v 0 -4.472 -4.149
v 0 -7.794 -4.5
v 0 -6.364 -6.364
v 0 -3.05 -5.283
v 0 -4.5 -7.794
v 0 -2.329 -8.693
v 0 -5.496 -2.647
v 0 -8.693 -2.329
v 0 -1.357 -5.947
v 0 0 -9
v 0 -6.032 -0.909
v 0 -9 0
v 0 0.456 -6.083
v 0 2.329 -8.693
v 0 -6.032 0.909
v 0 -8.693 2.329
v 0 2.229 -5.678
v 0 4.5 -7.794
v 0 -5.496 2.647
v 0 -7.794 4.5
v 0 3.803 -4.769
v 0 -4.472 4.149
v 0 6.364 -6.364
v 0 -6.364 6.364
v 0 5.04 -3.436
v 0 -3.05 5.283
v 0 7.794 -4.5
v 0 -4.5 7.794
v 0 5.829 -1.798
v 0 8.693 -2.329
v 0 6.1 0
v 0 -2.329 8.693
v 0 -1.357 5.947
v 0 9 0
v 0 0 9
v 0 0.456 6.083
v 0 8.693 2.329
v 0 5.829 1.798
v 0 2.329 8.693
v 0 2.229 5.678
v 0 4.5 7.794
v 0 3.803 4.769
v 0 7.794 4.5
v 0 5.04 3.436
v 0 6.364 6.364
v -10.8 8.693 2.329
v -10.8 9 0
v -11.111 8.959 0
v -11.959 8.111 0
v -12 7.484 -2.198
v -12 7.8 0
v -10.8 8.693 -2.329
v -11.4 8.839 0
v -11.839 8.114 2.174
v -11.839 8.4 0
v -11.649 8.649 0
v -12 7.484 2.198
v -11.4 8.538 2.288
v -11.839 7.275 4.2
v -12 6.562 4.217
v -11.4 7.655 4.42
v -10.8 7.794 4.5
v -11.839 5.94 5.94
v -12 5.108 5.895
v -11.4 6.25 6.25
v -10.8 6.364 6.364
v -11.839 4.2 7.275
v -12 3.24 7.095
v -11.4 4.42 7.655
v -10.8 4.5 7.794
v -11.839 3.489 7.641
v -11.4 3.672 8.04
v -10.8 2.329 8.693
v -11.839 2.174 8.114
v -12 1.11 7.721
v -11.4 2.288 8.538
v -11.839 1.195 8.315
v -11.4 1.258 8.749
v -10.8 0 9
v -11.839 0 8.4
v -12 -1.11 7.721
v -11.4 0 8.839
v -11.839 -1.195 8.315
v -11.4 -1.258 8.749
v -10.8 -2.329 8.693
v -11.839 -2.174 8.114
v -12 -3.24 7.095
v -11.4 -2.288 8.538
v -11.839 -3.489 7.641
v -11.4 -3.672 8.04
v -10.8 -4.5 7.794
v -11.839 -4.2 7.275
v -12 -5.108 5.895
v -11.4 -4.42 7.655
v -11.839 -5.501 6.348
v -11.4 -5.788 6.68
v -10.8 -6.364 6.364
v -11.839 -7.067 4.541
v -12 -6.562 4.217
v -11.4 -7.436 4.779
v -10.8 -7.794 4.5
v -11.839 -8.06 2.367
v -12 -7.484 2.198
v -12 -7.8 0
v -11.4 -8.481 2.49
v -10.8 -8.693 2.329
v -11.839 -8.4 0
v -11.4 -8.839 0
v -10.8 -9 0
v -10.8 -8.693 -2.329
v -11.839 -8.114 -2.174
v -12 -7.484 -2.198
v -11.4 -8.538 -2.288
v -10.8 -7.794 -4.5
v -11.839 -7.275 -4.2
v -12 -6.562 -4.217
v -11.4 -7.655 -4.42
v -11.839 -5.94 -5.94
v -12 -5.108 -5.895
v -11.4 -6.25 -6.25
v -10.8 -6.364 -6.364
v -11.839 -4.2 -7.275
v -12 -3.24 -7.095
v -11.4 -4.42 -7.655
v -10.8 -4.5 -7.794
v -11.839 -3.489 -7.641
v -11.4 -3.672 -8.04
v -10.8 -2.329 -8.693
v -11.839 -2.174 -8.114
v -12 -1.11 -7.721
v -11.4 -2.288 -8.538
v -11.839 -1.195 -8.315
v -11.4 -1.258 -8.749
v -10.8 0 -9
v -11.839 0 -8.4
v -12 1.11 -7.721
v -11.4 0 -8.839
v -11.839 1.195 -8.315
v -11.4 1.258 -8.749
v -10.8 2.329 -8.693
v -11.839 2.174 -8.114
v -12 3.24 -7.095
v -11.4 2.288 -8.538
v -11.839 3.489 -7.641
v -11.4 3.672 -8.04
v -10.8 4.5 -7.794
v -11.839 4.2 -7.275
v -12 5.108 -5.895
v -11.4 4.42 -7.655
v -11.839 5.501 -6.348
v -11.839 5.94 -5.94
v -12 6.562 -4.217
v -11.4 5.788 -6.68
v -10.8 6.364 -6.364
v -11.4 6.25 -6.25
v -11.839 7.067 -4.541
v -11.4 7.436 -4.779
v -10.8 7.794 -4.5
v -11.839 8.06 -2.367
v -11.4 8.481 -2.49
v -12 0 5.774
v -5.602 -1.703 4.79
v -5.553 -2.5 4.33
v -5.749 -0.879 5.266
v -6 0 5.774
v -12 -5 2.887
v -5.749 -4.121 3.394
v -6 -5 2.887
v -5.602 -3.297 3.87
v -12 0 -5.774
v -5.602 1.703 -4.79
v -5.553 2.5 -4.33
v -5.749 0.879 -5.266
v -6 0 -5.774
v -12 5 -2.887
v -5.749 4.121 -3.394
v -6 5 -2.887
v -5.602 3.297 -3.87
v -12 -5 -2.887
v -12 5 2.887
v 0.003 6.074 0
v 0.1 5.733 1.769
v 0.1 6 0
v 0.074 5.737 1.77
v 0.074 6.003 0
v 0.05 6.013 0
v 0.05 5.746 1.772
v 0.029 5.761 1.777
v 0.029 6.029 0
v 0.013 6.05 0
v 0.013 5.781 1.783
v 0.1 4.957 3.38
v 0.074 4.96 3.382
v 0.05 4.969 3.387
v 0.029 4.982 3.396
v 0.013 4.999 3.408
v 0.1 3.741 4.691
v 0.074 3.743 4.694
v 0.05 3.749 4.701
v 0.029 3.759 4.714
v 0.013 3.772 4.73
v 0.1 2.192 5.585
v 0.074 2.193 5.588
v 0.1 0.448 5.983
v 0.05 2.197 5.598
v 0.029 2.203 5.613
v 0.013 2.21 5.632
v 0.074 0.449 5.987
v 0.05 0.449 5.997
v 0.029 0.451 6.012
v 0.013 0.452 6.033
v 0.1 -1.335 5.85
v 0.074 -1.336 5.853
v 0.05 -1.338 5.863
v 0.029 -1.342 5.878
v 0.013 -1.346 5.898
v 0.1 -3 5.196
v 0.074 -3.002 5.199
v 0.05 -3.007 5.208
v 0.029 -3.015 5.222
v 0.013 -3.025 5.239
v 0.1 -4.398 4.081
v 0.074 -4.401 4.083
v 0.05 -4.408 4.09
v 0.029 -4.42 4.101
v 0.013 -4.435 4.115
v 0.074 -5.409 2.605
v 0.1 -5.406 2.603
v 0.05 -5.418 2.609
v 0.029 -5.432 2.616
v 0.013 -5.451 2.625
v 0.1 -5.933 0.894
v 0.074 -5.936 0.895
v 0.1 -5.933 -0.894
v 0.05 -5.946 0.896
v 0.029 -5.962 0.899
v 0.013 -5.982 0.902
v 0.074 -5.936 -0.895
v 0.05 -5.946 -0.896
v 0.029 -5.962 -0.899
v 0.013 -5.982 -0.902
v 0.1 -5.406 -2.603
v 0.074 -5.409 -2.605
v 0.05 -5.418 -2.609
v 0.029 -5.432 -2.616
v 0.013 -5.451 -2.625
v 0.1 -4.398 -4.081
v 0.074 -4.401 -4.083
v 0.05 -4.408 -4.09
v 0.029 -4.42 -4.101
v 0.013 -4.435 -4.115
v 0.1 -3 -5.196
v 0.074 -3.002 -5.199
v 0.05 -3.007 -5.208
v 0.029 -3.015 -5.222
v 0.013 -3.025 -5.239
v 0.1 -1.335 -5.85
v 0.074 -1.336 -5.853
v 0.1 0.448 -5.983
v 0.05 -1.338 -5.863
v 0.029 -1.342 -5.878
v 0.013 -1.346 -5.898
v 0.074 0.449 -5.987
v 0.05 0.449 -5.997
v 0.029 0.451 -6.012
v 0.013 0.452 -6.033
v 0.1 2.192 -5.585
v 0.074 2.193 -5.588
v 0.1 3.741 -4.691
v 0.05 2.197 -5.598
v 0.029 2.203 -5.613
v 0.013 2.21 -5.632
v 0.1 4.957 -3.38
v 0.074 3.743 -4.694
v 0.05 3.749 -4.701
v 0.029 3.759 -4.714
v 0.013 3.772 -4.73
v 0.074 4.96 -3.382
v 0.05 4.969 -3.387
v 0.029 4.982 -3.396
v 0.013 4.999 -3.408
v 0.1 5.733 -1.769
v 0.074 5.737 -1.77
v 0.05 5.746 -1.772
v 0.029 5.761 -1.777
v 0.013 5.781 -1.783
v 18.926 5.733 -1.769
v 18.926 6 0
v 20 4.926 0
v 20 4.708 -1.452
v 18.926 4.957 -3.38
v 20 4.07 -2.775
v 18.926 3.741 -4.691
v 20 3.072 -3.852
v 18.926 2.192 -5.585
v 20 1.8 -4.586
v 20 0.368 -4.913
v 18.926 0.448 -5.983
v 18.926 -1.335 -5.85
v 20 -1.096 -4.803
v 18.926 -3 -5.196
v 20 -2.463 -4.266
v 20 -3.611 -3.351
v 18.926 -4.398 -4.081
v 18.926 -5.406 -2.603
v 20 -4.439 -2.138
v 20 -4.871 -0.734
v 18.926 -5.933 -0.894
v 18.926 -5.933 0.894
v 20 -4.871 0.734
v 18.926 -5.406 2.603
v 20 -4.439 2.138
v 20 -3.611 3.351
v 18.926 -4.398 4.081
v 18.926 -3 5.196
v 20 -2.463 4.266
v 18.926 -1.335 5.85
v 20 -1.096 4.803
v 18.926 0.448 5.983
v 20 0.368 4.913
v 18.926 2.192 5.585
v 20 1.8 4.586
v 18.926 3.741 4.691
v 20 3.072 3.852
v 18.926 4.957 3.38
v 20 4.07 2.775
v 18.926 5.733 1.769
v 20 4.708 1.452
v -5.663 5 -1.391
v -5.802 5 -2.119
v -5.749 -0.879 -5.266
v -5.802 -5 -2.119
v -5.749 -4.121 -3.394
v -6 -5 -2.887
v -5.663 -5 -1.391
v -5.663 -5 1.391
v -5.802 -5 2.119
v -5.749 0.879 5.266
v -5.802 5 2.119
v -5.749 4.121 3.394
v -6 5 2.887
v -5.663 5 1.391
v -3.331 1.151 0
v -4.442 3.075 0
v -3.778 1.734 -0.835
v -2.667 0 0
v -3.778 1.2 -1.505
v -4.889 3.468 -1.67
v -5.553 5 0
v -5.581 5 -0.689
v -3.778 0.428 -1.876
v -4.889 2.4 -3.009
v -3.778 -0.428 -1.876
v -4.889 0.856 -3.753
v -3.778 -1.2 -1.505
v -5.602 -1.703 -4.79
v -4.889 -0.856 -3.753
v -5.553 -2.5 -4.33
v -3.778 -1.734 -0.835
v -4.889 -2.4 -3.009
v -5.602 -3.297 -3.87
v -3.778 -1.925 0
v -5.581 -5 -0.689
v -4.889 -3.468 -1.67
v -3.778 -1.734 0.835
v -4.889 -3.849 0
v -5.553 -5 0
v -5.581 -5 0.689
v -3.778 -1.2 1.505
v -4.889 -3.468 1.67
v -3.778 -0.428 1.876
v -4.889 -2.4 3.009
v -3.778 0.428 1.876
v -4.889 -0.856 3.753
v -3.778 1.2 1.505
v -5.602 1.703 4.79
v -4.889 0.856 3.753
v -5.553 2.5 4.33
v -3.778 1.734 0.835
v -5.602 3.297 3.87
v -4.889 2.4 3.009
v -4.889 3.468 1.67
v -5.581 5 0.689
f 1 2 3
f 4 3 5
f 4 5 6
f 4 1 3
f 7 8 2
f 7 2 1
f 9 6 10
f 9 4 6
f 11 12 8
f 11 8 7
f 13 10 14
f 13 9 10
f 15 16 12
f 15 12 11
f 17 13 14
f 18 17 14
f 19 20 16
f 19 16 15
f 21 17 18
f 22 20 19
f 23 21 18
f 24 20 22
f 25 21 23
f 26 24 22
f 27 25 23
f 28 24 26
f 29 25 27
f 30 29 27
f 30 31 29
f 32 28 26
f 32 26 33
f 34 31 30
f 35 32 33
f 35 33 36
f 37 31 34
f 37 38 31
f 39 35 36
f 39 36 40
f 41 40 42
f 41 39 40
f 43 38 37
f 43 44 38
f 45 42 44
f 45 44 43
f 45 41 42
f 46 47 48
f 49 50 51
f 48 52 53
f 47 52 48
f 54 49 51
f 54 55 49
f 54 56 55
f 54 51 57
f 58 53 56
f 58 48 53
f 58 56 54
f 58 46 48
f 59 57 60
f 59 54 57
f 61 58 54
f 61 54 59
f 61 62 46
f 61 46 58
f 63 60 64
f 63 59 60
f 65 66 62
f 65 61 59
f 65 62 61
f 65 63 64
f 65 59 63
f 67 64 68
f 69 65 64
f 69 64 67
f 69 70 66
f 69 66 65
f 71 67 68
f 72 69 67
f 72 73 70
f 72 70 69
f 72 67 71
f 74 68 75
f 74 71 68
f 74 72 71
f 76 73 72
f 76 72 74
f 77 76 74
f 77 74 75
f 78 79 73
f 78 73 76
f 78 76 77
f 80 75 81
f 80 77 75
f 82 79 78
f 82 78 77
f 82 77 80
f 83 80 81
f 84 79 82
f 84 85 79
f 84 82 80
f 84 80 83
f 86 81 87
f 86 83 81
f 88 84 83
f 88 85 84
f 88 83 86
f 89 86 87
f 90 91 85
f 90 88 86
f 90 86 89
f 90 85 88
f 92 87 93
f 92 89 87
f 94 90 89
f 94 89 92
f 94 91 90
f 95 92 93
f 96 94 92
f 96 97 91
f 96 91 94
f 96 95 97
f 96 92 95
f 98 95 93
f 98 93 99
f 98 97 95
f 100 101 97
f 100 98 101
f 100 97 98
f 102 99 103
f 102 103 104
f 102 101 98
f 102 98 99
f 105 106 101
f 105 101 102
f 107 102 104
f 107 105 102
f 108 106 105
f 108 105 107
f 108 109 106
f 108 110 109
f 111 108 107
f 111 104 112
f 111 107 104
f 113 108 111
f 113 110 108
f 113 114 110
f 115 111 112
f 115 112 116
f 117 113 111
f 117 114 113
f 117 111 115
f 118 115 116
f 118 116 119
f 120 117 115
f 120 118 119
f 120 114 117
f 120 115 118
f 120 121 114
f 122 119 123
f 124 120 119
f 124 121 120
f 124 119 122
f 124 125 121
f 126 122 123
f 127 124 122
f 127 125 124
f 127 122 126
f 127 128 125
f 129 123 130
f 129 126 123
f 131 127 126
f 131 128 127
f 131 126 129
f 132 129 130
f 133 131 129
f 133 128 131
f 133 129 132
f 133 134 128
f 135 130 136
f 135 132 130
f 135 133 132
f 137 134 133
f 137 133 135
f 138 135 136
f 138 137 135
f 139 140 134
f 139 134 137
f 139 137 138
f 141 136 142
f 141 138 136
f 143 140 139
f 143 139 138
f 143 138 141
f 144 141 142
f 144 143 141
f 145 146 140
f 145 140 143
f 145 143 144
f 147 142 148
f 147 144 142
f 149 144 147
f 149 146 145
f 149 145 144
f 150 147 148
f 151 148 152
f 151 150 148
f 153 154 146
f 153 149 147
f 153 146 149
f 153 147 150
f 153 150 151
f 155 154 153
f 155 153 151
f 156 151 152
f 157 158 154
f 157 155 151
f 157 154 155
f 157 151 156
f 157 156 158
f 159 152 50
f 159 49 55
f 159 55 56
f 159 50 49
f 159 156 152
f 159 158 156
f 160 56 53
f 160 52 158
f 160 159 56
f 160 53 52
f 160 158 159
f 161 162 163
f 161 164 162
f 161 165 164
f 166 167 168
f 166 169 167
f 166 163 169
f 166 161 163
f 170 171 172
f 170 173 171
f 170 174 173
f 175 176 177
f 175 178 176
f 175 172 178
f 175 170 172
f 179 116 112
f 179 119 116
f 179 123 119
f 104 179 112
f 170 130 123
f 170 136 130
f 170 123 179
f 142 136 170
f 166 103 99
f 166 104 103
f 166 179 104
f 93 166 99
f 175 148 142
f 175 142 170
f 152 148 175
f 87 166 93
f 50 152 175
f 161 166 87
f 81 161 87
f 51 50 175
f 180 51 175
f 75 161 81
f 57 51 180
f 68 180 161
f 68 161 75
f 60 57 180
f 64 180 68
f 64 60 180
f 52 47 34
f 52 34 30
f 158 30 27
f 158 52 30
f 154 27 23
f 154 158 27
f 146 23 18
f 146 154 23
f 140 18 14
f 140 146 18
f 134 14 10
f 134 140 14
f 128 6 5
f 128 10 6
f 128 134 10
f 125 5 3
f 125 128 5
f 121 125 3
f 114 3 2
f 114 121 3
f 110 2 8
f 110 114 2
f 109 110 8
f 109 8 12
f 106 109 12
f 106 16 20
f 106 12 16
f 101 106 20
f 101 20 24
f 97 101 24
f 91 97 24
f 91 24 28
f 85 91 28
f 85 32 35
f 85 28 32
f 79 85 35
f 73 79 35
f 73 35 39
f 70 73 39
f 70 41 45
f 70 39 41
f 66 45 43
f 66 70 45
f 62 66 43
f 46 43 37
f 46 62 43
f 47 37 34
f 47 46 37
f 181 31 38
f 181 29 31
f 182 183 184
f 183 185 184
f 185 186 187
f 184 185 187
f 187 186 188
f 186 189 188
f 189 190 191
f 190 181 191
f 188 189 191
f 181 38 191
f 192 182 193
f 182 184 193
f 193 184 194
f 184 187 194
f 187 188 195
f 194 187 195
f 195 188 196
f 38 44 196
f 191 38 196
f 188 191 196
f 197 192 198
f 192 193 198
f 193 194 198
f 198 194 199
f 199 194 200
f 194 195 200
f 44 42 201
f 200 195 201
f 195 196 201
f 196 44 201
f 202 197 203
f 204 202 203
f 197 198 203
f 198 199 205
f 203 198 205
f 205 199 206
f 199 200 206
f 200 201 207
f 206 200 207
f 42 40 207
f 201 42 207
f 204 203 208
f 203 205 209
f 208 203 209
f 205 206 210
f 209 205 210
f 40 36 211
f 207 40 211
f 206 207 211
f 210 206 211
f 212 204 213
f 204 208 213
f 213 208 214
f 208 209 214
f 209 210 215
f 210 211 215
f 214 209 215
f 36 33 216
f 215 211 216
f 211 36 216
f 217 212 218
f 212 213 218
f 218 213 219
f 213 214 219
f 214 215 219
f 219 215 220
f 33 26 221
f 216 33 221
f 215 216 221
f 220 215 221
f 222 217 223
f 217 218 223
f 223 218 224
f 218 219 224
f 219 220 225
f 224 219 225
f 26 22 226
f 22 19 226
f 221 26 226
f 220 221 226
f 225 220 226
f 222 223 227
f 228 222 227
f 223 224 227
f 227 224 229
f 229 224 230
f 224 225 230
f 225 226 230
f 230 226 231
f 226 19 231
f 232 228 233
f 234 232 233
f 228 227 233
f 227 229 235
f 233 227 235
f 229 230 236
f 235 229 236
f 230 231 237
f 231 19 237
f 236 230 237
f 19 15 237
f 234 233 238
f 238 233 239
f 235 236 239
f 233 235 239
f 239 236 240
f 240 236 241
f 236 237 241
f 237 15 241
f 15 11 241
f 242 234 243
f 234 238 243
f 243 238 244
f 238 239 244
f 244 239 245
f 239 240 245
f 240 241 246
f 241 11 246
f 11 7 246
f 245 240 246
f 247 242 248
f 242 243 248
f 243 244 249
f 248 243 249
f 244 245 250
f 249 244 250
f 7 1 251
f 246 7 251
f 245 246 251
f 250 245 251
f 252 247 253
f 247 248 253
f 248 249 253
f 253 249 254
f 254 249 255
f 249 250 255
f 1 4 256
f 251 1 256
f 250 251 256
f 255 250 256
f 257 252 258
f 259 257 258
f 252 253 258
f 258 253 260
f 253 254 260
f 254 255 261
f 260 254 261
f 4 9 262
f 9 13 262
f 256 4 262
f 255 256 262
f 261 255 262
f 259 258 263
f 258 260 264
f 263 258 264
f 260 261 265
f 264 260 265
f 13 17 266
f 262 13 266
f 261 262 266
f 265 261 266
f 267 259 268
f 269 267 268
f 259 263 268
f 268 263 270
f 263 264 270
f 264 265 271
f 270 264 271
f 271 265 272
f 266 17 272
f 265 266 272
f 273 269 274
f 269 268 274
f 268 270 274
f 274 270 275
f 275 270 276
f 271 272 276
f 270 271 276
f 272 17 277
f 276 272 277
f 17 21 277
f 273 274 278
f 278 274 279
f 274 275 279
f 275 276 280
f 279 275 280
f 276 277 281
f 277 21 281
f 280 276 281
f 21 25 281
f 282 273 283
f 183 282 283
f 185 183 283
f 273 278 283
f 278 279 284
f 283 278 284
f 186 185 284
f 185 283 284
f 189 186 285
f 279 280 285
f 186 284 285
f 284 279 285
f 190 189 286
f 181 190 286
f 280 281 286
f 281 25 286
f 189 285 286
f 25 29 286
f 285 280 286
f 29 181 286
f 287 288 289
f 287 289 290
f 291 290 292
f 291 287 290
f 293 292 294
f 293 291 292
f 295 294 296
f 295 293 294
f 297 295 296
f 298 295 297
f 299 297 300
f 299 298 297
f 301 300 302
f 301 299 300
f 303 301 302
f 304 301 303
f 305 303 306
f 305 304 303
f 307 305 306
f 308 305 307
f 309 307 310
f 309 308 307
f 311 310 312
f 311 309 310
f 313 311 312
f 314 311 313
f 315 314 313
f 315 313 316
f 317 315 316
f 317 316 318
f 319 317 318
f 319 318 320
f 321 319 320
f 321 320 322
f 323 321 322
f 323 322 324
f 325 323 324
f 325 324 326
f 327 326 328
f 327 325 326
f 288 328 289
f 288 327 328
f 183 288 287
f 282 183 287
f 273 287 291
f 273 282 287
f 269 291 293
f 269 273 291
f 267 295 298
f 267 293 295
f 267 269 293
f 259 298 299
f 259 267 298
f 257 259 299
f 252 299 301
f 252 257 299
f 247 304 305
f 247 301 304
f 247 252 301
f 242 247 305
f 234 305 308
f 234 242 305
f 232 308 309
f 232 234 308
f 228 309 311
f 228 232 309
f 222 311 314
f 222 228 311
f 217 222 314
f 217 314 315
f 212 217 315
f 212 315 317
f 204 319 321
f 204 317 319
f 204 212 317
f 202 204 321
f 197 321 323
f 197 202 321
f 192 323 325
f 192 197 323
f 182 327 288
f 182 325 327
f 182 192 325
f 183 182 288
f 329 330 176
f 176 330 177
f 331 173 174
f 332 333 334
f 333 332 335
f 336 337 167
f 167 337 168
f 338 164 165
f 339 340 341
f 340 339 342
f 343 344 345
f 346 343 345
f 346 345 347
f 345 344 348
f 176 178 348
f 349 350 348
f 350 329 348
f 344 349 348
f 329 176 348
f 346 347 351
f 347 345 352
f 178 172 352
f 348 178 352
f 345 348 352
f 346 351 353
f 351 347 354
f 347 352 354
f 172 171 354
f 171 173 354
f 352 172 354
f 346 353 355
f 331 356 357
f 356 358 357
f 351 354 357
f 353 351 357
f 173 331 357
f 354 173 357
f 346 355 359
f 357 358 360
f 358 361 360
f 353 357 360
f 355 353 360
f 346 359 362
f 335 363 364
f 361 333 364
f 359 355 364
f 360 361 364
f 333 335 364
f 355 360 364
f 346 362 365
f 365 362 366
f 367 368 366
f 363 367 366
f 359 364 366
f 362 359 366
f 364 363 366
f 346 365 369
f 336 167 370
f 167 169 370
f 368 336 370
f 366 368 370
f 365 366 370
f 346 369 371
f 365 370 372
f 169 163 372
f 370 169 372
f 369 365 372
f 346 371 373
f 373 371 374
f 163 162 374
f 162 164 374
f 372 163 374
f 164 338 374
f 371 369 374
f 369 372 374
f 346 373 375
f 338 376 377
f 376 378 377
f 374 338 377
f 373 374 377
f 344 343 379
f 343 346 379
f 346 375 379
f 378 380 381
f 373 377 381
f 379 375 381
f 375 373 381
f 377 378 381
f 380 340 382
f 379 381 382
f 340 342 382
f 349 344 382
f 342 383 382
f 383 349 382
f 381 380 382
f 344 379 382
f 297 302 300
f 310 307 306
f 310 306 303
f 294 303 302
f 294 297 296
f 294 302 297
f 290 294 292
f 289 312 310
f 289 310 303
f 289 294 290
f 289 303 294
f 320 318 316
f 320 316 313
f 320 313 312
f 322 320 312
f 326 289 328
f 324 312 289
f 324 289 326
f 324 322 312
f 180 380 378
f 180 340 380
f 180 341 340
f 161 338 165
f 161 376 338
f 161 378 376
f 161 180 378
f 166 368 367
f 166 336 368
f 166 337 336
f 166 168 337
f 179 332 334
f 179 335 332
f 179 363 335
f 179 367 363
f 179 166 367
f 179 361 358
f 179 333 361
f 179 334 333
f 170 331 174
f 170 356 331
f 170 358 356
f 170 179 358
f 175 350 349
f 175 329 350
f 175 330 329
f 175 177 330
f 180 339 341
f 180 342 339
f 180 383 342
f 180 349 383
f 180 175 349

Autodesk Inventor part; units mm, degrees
ref_plane "YZ Plane" through (0, 0, 0) normal (1, 0, 0) x (0, 1, 0)
ref_plane "XZ Plane" through (0, 0, 0) normal (0, 1, 0) x (-1, 0, 0)
sketch "Sketch1" plane through (0, 0, 0) normal (0, 0, 1) x (1, 0, 0)
  line L0 (-2.6667, 0) -> (20, 0)
  line L1 (20, 0) -> (20, 6)
  line L2 (20, 6) -> (4.375, 6)
  line L3 (4.375, 6) -> (3.3014, 6)
  line L4 (3.3014, 6) -> (0, 6)
  line L5 (0, 6) -> (0, 9)
  line L6 (0, 9) -> (-12, 9)
  line L7 (-12, 9) -> (-12, 5.7735)
  line L8 (-12, 5.7735) -> (-6, 5.7735)
  line L9 (-6, 5.7735) -> (-2.6667, 0)
  line L10 (-18.4, 0) -> (26.4, 0) projected
  line L11 (0, -1.8) -> (0, 10.8) projected
  line L12 (4.375, 6) -> (0, 6) construction
  dimension "d1" = 15.625
  dimension "d2" = 1.0736
  dimension "d3" = 12
  dimension "d4" = 6
  dimension "d5" = 60
  dimension "d6" = 12
  dimension "d7" = 12
  dimension "d8" = 11.547
  dimension "d9" = 18
  dimension "d26" = 20
revolve "Body" add sketch "Sketch1" angle 360 about axis through (-2.6667, 0, 0) along (1, 0, 0)
sketch "Sketch2" plane through (-12, 0, 0) normal (-1, 0, 0) x (0, 0, 1)
  circle A0 centre (0, 0) radius 5.7735 projected
  line L0 (0, -12.6) -> (0, 12.6) projected
  line L1 (-12.6, 0) -> (12.6, 0) projected
  line L2 (5.7735, 0) -> (2.8868, -5)
  line L3 (2.8868, -5) -> (-2.8868, -5)
  line L4 (-2.8868, -5) -> (-5.7735, 0)
  line L5 (-5.7735, 0) -> (-2.8868, 5)
  line L6 (-2.8868, 5) -> (2.8868, 5)
  line L7 (2.8868, 5) -> (5.7735, 0)
extrude "Slot" add sketch "Sketch2" against normal up to next contours L7 A0 | A0 L2 | L6 L0 A0 | A0 L0 L3 | L0 L6 A0 | A0 L3 L0 | L4 A0 | A0 L5
fillet "Fillet1" radius 1.2 1 edges at (-12, -9, 0)
thread "Thread" size "M12x1.75" class "6g" standard "ISO Metric profile" length 15.625
chamfer "Chamfer1" distance 1.0735 distance2 1.0735 1 edges at (20, -6, 0) measured on face at (20, -3.0269, -1.5886)
ref_plane "Work Plane1" through (29, 0, 0) normal (0, -1, 0) x (1, 0, 0)
fillet "Fillet2" radius 0.1 1 edges at (0, -6, 0)
equation "\"d1\" = GEL"
equation "\"d3\" = KOH"
equation "\"d4\" = INTI"
equation "\"d6\" = GD"
equation "\"d7\" = BDM"
equation "\"d8\" = 1.1547 * SW"
equation "\"d9\" = KOD"
equation "\"d26\" = NLG"
equation "\"d30\" = R"
equation "\"d17\" = RR"
equation "\"d13\" = GEL"
equation "\"d15\" = -0.5 * SPD + 0.5 * GD"
equation "\"d16\" = GUL"
equation "\"GD\" = NND"
equation "\"NLG\" = 20"
equation "\"GEL\" = 15.625"
equation "\"KOD\" = 18"
equation "\"KOH\" = NND"
equation "\"INTI\" = 6"
equation "\"GAL\" = 0.61345 * PTC"
equation "\"GUL\" = 0.61345 * PTC"
equation "\"BDM\" = NND"
equation "\"RR\" = 0.1 * NND"
equation "\"SPD\" = NND - 1.2269 * PTC"
equation "\"R\" = 0.1"
equation "\"PHH\" = 0.25"
equation "\"GD1\" = THREADDIA - 1.2269 * PTC"
equation "\"THREADDIA\" = 12"
equation "\"FAWI\" = 45deg"
equation "\"PTC\" = 1.75"
equation "\"KOH1\" = 10.8"
equation "\"NND\" = 12"
equation "\"TOA\" = 30deg"
equation "\"E0\" = 1.155 * SW"
equation "\"SW\" = 10"
properties part number "AS 1420 - 1973 - M12 x 20" material "Steel, Mild"
